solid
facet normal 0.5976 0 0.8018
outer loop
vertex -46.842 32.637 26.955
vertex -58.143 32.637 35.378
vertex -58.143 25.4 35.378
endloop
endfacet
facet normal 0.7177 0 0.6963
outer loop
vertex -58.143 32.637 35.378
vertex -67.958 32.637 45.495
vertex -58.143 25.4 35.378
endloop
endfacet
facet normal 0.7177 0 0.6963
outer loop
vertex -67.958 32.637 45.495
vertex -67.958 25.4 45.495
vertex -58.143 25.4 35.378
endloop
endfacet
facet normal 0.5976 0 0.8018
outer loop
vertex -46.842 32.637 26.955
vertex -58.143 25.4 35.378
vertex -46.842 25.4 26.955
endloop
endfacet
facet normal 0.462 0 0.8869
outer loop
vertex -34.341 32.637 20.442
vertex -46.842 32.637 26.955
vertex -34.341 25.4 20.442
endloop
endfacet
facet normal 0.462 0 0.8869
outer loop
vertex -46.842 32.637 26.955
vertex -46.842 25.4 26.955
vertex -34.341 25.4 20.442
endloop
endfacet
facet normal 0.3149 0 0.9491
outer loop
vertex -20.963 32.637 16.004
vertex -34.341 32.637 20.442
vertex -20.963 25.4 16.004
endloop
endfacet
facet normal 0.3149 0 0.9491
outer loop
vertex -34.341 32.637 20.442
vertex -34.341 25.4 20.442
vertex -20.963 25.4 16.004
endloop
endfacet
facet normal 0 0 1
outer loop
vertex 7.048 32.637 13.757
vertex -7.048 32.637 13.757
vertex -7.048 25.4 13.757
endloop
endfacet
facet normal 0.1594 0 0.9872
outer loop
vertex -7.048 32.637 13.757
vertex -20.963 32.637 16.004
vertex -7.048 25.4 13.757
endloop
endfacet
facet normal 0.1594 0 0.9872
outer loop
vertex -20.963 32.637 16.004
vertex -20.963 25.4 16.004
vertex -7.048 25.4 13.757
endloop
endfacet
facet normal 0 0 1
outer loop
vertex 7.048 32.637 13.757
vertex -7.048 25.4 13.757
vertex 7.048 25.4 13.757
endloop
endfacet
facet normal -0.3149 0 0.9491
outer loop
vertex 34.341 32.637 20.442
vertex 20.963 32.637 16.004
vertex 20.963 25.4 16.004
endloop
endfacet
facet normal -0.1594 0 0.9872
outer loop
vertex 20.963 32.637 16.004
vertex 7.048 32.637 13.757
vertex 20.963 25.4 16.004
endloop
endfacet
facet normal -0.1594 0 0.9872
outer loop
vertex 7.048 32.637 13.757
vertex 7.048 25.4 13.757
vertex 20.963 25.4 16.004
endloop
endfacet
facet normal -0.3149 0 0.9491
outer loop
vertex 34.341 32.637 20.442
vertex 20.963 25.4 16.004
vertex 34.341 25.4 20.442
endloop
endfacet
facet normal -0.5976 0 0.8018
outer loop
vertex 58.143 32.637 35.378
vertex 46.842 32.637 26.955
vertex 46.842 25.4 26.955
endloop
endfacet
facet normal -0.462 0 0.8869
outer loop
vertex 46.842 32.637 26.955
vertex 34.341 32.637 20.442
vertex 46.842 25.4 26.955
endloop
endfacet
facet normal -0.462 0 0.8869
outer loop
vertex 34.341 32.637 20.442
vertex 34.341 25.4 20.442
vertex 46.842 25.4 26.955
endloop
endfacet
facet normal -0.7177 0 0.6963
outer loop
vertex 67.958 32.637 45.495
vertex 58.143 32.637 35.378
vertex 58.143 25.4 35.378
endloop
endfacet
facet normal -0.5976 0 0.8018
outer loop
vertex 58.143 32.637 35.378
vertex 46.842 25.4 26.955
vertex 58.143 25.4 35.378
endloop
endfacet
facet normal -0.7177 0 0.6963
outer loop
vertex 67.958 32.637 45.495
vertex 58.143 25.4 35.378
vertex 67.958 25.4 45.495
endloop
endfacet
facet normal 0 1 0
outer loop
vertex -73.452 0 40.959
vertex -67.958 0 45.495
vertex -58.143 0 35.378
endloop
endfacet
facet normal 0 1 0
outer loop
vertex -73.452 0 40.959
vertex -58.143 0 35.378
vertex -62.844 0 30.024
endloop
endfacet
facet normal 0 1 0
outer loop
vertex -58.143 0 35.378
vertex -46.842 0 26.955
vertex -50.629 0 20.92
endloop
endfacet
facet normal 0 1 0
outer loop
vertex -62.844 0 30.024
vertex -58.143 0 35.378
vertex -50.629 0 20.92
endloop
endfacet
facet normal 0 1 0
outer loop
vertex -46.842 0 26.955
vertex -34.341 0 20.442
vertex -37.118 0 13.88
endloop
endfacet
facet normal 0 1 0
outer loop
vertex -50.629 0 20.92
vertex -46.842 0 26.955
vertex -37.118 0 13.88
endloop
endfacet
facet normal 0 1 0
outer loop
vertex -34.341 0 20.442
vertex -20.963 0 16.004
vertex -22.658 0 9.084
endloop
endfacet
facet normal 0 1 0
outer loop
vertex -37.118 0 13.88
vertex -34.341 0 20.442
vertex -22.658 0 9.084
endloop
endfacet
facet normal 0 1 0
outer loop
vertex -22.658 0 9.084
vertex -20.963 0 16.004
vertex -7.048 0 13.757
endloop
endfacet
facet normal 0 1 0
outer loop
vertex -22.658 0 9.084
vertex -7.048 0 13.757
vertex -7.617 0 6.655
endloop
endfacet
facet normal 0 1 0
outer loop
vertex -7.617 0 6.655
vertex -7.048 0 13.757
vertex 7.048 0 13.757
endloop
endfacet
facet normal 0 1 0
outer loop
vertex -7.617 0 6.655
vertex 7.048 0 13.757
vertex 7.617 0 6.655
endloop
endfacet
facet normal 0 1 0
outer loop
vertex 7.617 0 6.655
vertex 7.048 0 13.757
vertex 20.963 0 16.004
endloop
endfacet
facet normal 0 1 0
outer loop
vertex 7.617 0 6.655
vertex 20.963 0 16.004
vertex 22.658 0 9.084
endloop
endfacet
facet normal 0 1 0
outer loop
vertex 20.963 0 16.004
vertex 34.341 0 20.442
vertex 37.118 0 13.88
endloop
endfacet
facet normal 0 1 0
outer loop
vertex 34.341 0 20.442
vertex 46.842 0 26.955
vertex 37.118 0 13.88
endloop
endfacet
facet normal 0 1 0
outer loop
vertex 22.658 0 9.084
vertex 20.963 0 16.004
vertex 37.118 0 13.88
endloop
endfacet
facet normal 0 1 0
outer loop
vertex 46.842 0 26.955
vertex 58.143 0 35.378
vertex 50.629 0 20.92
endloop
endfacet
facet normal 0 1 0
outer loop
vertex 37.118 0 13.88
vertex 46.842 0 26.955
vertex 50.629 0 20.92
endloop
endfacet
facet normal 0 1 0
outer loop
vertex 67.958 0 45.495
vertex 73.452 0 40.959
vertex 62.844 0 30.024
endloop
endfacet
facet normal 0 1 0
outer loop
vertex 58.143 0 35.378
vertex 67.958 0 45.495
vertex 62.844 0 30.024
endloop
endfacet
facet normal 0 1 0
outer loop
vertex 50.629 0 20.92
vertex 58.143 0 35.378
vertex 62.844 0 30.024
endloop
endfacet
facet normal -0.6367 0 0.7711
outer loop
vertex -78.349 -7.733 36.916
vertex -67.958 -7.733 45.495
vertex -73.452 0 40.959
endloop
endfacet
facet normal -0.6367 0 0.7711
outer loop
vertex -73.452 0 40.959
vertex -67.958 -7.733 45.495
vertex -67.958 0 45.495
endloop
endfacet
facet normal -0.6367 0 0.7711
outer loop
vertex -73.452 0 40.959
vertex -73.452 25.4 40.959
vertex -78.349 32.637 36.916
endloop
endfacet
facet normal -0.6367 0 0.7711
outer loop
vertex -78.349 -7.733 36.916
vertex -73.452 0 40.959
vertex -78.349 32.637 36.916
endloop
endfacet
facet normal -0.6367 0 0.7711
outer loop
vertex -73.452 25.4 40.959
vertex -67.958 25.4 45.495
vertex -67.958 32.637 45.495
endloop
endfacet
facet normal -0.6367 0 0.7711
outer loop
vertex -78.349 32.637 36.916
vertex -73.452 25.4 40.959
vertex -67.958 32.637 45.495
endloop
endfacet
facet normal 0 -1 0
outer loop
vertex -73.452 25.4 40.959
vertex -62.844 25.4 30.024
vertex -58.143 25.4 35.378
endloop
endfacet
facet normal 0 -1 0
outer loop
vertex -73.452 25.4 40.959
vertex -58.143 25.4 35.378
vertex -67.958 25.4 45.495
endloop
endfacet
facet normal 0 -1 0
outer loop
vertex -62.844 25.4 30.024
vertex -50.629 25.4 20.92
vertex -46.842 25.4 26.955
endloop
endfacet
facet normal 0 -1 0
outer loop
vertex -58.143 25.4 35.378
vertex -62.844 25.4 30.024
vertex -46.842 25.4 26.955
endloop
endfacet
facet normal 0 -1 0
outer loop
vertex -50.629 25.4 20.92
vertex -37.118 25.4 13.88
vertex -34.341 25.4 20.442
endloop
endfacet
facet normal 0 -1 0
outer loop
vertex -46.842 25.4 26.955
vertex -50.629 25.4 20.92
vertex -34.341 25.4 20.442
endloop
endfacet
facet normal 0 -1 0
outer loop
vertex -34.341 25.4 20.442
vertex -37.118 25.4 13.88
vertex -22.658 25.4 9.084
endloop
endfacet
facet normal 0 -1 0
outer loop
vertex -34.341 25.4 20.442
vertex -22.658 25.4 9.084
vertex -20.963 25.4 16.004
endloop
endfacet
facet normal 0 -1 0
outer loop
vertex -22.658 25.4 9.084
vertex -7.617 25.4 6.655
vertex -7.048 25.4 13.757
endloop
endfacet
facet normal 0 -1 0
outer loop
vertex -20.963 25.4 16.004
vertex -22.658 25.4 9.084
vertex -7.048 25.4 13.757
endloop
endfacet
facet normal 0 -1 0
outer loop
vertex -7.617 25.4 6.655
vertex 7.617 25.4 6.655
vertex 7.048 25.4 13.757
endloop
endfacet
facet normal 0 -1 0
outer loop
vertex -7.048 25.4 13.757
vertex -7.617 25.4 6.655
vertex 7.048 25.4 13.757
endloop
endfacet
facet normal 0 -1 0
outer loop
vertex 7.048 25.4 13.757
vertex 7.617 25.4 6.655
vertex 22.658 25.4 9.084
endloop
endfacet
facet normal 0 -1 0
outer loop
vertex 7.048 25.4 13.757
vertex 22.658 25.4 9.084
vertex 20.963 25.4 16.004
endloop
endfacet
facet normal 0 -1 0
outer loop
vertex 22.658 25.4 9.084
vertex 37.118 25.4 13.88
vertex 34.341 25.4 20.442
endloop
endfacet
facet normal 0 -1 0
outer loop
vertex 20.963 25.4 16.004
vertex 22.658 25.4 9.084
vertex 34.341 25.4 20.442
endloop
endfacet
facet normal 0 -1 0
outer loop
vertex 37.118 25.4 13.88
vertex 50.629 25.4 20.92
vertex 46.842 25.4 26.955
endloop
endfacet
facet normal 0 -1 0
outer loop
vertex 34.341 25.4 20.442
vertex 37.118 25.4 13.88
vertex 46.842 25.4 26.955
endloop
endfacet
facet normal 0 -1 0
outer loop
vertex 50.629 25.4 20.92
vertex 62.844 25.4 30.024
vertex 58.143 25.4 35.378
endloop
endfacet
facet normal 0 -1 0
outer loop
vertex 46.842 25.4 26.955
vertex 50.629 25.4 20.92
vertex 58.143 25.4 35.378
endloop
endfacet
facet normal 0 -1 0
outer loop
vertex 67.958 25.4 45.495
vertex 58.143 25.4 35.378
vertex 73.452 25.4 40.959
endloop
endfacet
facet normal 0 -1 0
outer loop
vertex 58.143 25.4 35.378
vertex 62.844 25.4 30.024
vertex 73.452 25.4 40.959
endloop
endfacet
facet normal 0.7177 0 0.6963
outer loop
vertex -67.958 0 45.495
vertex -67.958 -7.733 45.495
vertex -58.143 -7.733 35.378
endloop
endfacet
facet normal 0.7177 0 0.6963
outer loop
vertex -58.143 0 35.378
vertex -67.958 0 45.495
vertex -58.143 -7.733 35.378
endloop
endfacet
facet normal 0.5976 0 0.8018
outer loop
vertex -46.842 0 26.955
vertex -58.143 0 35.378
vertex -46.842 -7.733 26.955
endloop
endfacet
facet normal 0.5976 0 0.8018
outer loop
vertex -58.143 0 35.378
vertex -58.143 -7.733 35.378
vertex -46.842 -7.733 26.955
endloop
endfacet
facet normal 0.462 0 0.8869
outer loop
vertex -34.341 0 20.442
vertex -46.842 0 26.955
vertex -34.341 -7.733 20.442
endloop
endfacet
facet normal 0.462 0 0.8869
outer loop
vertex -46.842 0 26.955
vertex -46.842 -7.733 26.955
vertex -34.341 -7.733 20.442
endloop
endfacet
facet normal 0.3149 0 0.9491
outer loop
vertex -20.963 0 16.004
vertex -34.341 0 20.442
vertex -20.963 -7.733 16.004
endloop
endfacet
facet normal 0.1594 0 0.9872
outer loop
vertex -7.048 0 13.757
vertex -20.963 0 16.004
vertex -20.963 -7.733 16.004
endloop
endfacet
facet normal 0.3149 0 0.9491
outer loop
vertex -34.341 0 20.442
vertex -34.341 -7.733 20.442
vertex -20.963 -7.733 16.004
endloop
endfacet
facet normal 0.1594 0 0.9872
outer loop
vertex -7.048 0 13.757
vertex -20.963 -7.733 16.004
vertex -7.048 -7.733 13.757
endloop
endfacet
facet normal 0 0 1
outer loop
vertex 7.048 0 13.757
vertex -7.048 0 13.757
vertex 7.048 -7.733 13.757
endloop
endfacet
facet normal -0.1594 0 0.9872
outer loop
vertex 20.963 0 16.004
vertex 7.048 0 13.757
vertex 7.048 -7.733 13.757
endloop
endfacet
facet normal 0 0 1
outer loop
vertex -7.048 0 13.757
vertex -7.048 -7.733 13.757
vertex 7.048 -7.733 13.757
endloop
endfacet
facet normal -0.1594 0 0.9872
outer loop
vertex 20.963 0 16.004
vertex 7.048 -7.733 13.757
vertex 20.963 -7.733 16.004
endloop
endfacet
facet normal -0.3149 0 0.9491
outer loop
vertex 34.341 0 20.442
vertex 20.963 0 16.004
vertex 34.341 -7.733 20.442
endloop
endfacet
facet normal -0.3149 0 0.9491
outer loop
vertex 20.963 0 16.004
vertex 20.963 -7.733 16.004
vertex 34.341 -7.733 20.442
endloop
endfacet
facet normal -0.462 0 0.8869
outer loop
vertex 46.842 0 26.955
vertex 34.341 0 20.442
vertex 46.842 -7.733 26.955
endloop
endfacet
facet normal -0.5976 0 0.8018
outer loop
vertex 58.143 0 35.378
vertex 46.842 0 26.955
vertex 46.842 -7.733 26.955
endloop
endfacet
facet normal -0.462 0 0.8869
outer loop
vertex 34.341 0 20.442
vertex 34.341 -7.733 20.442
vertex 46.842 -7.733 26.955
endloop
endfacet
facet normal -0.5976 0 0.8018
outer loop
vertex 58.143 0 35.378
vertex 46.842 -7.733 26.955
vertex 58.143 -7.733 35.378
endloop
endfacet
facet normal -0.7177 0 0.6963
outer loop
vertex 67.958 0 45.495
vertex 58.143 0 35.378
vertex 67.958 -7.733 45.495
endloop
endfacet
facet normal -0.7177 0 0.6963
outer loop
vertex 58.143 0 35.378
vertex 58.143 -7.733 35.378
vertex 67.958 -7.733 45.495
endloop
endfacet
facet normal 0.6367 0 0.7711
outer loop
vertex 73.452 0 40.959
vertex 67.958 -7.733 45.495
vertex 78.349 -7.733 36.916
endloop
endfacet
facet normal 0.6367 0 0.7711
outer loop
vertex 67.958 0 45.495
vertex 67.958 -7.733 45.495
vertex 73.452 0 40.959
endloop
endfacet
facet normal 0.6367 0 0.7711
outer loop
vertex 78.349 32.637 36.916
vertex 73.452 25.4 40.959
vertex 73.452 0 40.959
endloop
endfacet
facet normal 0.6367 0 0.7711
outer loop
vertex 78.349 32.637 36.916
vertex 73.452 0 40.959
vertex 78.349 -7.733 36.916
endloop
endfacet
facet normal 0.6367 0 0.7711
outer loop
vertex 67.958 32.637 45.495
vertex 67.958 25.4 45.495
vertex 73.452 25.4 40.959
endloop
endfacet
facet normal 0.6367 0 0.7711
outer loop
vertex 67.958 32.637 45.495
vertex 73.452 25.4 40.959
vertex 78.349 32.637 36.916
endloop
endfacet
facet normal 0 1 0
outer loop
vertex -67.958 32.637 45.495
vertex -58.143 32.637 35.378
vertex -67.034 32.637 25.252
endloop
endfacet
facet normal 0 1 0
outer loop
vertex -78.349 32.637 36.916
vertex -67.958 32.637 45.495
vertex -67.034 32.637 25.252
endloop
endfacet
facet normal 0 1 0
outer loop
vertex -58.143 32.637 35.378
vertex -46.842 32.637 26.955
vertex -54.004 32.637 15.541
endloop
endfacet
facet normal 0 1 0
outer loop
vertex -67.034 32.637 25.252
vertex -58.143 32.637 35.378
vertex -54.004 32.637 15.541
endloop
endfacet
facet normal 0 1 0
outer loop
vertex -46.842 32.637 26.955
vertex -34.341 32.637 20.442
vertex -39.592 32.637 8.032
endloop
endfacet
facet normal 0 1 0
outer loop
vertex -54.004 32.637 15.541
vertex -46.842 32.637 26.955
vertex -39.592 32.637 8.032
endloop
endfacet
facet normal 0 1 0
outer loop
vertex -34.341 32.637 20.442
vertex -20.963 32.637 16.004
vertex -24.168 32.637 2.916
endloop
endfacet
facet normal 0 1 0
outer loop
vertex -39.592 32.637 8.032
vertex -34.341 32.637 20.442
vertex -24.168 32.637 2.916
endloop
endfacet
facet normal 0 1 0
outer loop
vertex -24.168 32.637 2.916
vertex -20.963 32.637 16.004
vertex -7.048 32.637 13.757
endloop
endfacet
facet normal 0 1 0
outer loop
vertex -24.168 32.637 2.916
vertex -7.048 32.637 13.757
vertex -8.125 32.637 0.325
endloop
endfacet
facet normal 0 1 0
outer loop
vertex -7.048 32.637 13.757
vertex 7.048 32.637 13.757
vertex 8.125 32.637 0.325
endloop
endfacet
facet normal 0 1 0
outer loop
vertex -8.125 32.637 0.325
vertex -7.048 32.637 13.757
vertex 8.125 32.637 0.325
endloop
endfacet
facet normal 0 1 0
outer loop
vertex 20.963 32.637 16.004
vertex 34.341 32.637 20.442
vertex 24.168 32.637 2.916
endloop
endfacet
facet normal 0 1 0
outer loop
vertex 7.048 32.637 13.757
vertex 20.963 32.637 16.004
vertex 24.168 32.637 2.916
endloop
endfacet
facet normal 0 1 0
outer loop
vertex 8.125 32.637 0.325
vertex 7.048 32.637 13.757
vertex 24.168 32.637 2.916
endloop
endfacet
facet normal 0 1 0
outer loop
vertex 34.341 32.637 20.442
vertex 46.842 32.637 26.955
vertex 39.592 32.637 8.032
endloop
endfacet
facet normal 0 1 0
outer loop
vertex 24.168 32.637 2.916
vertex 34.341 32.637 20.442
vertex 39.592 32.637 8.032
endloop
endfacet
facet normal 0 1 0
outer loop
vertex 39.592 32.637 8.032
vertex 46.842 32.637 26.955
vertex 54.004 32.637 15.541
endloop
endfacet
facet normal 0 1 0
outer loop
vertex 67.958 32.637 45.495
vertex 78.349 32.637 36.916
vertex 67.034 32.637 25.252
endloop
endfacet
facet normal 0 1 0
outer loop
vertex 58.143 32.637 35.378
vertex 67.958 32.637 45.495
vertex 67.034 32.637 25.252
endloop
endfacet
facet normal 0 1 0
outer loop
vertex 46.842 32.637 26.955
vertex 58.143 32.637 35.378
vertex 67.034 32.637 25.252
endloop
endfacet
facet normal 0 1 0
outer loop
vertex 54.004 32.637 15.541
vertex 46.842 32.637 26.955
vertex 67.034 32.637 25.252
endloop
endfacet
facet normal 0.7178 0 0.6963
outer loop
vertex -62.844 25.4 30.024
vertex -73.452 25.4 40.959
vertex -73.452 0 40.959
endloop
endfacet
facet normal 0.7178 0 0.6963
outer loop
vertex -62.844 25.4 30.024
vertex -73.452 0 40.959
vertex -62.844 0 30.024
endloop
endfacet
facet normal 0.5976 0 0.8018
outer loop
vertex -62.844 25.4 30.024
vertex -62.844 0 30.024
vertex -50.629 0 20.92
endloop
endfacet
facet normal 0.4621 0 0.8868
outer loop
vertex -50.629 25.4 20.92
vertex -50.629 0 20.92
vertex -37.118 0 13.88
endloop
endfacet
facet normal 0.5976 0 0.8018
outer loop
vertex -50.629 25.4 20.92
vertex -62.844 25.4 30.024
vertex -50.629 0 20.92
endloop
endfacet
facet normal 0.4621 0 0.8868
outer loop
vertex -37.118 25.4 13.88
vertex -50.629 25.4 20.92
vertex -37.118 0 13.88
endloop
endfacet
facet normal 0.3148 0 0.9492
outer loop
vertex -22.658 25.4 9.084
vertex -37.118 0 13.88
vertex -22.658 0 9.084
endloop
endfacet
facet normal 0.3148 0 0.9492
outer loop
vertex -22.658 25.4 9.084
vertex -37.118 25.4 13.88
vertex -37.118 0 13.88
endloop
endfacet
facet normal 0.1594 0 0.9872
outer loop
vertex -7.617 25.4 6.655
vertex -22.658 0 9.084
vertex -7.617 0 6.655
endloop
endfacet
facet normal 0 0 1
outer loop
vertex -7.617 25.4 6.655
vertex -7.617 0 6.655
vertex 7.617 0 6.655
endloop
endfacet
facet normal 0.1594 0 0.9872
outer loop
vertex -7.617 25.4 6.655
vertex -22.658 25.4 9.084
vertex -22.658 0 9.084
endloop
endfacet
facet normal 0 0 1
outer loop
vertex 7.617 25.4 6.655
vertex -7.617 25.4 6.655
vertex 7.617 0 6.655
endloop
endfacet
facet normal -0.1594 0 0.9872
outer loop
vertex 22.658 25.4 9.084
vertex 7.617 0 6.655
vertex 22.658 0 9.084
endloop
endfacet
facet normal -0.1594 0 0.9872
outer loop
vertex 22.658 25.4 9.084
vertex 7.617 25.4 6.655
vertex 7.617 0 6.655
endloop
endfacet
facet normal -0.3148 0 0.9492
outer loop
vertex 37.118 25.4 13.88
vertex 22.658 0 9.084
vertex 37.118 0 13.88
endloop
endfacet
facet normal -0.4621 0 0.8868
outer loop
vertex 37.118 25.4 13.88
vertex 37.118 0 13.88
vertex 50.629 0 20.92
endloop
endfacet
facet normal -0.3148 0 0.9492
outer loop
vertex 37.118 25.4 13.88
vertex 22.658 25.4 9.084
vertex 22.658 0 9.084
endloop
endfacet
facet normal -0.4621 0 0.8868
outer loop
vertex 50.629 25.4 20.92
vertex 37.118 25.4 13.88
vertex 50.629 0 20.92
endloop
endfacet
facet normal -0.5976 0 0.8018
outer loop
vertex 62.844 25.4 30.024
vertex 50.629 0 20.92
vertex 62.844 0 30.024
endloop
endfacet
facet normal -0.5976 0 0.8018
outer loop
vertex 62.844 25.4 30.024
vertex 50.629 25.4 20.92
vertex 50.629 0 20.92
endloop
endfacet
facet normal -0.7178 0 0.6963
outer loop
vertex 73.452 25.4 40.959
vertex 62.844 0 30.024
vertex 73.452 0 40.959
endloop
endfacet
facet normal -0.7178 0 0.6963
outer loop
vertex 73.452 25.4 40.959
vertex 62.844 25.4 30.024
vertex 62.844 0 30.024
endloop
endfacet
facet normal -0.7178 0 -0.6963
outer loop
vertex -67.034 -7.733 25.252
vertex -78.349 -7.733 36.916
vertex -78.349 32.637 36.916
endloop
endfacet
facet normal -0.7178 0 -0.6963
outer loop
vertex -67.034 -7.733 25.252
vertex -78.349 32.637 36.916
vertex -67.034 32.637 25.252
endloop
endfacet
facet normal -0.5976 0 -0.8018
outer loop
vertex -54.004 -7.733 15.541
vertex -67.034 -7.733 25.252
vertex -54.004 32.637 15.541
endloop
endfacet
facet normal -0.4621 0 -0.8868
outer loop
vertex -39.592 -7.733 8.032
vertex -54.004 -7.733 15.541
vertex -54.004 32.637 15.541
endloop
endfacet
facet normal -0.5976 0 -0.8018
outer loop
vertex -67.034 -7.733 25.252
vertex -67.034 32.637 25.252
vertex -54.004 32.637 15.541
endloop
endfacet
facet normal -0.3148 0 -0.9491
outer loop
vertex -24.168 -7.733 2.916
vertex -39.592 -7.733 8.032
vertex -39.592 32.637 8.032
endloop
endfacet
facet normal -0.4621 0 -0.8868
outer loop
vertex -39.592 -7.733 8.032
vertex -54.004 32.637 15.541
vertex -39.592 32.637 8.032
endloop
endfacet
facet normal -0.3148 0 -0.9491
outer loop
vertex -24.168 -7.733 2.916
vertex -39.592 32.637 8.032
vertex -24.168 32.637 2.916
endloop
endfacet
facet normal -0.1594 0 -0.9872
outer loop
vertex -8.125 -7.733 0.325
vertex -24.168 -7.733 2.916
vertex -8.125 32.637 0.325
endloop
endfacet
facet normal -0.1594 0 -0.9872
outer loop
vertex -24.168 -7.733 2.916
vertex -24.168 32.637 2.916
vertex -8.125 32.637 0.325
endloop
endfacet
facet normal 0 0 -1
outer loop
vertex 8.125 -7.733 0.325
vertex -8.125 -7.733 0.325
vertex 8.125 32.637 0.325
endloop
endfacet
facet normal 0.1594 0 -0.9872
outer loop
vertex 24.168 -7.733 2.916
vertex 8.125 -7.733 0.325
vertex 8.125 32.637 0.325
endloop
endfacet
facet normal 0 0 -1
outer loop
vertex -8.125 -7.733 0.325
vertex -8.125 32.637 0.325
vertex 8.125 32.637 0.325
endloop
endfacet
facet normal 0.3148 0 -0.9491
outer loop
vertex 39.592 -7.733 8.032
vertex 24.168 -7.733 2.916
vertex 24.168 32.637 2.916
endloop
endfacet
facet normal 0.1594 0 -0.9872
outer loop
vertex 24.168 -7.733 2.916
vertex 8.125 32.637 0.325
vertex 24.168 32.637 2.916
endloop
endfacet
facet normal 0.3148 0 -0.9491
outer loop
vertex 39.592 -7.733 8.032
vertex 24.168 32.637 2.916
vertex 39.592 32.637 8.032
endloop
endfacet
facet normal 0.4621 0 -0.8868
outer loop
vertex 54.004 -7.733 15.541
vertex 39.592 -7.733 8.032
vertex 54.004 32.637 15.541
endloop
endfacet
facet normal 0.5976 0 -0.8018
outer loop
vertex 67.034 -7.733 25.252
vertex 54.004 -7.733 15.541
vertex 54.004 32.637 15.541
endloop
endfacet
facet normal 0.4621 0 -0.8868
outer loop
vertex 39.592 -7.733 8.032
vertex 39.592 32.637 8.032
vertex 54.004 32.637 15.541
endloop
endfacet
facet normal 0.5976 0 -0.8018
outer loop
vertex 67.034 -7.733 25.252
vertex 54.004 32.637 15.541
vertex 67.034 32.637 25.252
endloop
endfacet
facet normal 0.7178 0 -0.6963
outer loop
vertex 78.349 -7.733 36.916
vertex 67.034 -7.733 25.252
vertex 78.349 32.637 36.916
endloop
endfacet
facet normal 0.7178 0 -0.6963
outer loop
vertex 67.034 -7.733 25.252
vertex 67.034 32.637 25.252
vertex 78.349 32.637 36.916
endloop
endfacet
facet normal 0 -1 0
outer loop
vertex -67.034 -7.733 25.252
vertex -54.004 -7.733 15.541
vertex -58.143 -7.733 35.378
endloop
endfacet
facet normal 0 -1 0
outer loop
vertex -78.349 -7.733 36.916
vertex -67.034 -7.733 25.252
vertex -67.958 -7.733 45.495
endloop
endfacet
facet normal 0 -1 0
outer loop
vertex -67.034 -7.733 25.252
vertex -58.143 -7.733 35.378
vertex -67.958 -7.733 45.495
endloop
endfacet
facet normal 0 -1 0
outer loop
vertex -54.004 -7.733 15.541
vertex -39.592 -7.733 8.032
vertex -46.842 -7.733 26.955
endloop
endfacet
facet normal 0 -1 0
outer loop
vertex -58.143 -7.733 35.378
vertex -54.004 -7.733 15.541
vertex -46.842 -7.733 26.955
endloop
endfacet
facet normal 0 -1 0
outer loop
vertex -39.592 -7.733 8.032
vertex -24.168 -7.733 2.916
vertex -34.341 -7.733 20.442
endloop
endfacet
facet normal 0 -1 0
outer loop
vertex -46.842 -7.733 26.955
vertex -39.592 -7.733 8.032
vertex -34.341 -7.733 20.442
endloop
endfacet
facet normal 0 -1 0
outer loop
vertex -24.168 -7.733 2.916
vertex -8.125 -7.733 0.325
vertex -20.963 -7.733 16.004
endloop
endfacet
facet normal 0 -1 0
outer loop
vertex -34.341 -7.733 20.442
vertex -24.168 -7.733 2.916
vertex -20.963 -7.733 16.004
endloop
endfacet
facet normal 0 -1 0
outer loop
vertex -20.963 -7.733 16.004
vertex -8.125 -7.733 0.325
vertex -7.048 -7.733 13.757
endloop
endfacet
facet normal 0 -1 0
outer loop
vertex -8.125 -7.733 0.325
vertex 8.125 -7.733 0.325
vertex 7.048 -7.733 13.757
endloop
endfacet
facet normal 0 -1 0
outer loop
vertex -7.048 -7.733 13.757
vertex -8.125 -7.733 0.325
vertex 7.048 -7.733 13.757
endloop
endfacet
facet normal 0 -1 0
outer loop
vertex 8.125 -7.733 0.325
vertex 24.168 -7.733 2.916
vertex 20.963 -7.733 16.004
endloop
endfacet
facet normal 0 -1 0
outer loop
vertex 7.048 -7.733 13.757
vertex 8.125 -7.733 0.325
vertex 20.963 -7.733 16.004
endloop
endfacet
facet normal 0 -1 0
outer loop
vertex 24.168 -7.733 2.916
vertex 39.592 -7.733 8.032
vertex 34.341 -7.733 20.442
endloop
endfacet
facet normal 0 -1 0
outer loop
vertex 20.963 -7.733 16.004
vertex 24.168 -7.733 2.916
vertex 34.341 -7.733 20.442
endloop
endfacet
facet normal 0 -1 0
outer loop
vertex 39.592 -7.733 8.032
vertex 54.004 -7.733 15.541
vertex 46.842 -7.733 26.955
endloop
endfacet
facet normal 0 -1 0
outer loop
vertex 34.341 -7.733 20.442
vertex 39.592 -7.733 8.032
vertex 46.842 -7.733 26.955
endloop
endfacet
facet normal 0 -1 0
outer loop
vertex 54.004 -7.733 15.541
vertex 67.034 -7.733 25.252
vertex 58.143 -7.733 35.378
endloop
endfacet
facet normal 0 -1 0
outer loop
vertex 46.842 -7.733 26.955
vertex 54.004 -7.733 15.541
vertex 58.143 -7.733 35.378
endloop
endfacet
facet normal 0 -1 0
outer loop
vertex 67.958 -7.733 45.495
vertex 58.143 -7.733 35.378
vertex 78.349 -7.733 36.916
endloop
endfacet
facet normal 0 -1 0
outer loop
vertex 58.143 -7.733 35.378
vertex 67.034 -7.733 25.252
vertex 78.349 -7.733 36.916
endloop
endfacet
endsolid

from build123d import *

# Parameters (mm, degrees)
F0_W     = 25.4
F0_H     = 6.35
F1_ANGLE = 100.914843


with BuildPart() as f1:
    # F0 (on Right) → F1 (revolve, symmetric)
    with BuildSketch(Plane.YZ) as f1_sk:
        with Locations((12.7, 3.175)):
            Rectangle(F0_W, F0_H)
        Polygon((-7.733337, 0), (0, 0), (0, 6.35), (0, 13.47493), (-7.733337, 13.47493), align=None)
        Polygon((25.4, 6.35), (25.4, 0), (32.637283, 0), (32.637283, 13.47493), (25.4, 13.47493), align=None)
    revolve(axis=Axis((0, 12.517576, 101.6), (0, 1, 0)), revolution_arc=F1_ANGLE / 2)
    revolve(f1_sk.sketch, axis=Axis((0, 12.517576, 101.6), (0, -1, 0)), revolution_arc=F1_ANGLE / 2)


solid = f1.part
